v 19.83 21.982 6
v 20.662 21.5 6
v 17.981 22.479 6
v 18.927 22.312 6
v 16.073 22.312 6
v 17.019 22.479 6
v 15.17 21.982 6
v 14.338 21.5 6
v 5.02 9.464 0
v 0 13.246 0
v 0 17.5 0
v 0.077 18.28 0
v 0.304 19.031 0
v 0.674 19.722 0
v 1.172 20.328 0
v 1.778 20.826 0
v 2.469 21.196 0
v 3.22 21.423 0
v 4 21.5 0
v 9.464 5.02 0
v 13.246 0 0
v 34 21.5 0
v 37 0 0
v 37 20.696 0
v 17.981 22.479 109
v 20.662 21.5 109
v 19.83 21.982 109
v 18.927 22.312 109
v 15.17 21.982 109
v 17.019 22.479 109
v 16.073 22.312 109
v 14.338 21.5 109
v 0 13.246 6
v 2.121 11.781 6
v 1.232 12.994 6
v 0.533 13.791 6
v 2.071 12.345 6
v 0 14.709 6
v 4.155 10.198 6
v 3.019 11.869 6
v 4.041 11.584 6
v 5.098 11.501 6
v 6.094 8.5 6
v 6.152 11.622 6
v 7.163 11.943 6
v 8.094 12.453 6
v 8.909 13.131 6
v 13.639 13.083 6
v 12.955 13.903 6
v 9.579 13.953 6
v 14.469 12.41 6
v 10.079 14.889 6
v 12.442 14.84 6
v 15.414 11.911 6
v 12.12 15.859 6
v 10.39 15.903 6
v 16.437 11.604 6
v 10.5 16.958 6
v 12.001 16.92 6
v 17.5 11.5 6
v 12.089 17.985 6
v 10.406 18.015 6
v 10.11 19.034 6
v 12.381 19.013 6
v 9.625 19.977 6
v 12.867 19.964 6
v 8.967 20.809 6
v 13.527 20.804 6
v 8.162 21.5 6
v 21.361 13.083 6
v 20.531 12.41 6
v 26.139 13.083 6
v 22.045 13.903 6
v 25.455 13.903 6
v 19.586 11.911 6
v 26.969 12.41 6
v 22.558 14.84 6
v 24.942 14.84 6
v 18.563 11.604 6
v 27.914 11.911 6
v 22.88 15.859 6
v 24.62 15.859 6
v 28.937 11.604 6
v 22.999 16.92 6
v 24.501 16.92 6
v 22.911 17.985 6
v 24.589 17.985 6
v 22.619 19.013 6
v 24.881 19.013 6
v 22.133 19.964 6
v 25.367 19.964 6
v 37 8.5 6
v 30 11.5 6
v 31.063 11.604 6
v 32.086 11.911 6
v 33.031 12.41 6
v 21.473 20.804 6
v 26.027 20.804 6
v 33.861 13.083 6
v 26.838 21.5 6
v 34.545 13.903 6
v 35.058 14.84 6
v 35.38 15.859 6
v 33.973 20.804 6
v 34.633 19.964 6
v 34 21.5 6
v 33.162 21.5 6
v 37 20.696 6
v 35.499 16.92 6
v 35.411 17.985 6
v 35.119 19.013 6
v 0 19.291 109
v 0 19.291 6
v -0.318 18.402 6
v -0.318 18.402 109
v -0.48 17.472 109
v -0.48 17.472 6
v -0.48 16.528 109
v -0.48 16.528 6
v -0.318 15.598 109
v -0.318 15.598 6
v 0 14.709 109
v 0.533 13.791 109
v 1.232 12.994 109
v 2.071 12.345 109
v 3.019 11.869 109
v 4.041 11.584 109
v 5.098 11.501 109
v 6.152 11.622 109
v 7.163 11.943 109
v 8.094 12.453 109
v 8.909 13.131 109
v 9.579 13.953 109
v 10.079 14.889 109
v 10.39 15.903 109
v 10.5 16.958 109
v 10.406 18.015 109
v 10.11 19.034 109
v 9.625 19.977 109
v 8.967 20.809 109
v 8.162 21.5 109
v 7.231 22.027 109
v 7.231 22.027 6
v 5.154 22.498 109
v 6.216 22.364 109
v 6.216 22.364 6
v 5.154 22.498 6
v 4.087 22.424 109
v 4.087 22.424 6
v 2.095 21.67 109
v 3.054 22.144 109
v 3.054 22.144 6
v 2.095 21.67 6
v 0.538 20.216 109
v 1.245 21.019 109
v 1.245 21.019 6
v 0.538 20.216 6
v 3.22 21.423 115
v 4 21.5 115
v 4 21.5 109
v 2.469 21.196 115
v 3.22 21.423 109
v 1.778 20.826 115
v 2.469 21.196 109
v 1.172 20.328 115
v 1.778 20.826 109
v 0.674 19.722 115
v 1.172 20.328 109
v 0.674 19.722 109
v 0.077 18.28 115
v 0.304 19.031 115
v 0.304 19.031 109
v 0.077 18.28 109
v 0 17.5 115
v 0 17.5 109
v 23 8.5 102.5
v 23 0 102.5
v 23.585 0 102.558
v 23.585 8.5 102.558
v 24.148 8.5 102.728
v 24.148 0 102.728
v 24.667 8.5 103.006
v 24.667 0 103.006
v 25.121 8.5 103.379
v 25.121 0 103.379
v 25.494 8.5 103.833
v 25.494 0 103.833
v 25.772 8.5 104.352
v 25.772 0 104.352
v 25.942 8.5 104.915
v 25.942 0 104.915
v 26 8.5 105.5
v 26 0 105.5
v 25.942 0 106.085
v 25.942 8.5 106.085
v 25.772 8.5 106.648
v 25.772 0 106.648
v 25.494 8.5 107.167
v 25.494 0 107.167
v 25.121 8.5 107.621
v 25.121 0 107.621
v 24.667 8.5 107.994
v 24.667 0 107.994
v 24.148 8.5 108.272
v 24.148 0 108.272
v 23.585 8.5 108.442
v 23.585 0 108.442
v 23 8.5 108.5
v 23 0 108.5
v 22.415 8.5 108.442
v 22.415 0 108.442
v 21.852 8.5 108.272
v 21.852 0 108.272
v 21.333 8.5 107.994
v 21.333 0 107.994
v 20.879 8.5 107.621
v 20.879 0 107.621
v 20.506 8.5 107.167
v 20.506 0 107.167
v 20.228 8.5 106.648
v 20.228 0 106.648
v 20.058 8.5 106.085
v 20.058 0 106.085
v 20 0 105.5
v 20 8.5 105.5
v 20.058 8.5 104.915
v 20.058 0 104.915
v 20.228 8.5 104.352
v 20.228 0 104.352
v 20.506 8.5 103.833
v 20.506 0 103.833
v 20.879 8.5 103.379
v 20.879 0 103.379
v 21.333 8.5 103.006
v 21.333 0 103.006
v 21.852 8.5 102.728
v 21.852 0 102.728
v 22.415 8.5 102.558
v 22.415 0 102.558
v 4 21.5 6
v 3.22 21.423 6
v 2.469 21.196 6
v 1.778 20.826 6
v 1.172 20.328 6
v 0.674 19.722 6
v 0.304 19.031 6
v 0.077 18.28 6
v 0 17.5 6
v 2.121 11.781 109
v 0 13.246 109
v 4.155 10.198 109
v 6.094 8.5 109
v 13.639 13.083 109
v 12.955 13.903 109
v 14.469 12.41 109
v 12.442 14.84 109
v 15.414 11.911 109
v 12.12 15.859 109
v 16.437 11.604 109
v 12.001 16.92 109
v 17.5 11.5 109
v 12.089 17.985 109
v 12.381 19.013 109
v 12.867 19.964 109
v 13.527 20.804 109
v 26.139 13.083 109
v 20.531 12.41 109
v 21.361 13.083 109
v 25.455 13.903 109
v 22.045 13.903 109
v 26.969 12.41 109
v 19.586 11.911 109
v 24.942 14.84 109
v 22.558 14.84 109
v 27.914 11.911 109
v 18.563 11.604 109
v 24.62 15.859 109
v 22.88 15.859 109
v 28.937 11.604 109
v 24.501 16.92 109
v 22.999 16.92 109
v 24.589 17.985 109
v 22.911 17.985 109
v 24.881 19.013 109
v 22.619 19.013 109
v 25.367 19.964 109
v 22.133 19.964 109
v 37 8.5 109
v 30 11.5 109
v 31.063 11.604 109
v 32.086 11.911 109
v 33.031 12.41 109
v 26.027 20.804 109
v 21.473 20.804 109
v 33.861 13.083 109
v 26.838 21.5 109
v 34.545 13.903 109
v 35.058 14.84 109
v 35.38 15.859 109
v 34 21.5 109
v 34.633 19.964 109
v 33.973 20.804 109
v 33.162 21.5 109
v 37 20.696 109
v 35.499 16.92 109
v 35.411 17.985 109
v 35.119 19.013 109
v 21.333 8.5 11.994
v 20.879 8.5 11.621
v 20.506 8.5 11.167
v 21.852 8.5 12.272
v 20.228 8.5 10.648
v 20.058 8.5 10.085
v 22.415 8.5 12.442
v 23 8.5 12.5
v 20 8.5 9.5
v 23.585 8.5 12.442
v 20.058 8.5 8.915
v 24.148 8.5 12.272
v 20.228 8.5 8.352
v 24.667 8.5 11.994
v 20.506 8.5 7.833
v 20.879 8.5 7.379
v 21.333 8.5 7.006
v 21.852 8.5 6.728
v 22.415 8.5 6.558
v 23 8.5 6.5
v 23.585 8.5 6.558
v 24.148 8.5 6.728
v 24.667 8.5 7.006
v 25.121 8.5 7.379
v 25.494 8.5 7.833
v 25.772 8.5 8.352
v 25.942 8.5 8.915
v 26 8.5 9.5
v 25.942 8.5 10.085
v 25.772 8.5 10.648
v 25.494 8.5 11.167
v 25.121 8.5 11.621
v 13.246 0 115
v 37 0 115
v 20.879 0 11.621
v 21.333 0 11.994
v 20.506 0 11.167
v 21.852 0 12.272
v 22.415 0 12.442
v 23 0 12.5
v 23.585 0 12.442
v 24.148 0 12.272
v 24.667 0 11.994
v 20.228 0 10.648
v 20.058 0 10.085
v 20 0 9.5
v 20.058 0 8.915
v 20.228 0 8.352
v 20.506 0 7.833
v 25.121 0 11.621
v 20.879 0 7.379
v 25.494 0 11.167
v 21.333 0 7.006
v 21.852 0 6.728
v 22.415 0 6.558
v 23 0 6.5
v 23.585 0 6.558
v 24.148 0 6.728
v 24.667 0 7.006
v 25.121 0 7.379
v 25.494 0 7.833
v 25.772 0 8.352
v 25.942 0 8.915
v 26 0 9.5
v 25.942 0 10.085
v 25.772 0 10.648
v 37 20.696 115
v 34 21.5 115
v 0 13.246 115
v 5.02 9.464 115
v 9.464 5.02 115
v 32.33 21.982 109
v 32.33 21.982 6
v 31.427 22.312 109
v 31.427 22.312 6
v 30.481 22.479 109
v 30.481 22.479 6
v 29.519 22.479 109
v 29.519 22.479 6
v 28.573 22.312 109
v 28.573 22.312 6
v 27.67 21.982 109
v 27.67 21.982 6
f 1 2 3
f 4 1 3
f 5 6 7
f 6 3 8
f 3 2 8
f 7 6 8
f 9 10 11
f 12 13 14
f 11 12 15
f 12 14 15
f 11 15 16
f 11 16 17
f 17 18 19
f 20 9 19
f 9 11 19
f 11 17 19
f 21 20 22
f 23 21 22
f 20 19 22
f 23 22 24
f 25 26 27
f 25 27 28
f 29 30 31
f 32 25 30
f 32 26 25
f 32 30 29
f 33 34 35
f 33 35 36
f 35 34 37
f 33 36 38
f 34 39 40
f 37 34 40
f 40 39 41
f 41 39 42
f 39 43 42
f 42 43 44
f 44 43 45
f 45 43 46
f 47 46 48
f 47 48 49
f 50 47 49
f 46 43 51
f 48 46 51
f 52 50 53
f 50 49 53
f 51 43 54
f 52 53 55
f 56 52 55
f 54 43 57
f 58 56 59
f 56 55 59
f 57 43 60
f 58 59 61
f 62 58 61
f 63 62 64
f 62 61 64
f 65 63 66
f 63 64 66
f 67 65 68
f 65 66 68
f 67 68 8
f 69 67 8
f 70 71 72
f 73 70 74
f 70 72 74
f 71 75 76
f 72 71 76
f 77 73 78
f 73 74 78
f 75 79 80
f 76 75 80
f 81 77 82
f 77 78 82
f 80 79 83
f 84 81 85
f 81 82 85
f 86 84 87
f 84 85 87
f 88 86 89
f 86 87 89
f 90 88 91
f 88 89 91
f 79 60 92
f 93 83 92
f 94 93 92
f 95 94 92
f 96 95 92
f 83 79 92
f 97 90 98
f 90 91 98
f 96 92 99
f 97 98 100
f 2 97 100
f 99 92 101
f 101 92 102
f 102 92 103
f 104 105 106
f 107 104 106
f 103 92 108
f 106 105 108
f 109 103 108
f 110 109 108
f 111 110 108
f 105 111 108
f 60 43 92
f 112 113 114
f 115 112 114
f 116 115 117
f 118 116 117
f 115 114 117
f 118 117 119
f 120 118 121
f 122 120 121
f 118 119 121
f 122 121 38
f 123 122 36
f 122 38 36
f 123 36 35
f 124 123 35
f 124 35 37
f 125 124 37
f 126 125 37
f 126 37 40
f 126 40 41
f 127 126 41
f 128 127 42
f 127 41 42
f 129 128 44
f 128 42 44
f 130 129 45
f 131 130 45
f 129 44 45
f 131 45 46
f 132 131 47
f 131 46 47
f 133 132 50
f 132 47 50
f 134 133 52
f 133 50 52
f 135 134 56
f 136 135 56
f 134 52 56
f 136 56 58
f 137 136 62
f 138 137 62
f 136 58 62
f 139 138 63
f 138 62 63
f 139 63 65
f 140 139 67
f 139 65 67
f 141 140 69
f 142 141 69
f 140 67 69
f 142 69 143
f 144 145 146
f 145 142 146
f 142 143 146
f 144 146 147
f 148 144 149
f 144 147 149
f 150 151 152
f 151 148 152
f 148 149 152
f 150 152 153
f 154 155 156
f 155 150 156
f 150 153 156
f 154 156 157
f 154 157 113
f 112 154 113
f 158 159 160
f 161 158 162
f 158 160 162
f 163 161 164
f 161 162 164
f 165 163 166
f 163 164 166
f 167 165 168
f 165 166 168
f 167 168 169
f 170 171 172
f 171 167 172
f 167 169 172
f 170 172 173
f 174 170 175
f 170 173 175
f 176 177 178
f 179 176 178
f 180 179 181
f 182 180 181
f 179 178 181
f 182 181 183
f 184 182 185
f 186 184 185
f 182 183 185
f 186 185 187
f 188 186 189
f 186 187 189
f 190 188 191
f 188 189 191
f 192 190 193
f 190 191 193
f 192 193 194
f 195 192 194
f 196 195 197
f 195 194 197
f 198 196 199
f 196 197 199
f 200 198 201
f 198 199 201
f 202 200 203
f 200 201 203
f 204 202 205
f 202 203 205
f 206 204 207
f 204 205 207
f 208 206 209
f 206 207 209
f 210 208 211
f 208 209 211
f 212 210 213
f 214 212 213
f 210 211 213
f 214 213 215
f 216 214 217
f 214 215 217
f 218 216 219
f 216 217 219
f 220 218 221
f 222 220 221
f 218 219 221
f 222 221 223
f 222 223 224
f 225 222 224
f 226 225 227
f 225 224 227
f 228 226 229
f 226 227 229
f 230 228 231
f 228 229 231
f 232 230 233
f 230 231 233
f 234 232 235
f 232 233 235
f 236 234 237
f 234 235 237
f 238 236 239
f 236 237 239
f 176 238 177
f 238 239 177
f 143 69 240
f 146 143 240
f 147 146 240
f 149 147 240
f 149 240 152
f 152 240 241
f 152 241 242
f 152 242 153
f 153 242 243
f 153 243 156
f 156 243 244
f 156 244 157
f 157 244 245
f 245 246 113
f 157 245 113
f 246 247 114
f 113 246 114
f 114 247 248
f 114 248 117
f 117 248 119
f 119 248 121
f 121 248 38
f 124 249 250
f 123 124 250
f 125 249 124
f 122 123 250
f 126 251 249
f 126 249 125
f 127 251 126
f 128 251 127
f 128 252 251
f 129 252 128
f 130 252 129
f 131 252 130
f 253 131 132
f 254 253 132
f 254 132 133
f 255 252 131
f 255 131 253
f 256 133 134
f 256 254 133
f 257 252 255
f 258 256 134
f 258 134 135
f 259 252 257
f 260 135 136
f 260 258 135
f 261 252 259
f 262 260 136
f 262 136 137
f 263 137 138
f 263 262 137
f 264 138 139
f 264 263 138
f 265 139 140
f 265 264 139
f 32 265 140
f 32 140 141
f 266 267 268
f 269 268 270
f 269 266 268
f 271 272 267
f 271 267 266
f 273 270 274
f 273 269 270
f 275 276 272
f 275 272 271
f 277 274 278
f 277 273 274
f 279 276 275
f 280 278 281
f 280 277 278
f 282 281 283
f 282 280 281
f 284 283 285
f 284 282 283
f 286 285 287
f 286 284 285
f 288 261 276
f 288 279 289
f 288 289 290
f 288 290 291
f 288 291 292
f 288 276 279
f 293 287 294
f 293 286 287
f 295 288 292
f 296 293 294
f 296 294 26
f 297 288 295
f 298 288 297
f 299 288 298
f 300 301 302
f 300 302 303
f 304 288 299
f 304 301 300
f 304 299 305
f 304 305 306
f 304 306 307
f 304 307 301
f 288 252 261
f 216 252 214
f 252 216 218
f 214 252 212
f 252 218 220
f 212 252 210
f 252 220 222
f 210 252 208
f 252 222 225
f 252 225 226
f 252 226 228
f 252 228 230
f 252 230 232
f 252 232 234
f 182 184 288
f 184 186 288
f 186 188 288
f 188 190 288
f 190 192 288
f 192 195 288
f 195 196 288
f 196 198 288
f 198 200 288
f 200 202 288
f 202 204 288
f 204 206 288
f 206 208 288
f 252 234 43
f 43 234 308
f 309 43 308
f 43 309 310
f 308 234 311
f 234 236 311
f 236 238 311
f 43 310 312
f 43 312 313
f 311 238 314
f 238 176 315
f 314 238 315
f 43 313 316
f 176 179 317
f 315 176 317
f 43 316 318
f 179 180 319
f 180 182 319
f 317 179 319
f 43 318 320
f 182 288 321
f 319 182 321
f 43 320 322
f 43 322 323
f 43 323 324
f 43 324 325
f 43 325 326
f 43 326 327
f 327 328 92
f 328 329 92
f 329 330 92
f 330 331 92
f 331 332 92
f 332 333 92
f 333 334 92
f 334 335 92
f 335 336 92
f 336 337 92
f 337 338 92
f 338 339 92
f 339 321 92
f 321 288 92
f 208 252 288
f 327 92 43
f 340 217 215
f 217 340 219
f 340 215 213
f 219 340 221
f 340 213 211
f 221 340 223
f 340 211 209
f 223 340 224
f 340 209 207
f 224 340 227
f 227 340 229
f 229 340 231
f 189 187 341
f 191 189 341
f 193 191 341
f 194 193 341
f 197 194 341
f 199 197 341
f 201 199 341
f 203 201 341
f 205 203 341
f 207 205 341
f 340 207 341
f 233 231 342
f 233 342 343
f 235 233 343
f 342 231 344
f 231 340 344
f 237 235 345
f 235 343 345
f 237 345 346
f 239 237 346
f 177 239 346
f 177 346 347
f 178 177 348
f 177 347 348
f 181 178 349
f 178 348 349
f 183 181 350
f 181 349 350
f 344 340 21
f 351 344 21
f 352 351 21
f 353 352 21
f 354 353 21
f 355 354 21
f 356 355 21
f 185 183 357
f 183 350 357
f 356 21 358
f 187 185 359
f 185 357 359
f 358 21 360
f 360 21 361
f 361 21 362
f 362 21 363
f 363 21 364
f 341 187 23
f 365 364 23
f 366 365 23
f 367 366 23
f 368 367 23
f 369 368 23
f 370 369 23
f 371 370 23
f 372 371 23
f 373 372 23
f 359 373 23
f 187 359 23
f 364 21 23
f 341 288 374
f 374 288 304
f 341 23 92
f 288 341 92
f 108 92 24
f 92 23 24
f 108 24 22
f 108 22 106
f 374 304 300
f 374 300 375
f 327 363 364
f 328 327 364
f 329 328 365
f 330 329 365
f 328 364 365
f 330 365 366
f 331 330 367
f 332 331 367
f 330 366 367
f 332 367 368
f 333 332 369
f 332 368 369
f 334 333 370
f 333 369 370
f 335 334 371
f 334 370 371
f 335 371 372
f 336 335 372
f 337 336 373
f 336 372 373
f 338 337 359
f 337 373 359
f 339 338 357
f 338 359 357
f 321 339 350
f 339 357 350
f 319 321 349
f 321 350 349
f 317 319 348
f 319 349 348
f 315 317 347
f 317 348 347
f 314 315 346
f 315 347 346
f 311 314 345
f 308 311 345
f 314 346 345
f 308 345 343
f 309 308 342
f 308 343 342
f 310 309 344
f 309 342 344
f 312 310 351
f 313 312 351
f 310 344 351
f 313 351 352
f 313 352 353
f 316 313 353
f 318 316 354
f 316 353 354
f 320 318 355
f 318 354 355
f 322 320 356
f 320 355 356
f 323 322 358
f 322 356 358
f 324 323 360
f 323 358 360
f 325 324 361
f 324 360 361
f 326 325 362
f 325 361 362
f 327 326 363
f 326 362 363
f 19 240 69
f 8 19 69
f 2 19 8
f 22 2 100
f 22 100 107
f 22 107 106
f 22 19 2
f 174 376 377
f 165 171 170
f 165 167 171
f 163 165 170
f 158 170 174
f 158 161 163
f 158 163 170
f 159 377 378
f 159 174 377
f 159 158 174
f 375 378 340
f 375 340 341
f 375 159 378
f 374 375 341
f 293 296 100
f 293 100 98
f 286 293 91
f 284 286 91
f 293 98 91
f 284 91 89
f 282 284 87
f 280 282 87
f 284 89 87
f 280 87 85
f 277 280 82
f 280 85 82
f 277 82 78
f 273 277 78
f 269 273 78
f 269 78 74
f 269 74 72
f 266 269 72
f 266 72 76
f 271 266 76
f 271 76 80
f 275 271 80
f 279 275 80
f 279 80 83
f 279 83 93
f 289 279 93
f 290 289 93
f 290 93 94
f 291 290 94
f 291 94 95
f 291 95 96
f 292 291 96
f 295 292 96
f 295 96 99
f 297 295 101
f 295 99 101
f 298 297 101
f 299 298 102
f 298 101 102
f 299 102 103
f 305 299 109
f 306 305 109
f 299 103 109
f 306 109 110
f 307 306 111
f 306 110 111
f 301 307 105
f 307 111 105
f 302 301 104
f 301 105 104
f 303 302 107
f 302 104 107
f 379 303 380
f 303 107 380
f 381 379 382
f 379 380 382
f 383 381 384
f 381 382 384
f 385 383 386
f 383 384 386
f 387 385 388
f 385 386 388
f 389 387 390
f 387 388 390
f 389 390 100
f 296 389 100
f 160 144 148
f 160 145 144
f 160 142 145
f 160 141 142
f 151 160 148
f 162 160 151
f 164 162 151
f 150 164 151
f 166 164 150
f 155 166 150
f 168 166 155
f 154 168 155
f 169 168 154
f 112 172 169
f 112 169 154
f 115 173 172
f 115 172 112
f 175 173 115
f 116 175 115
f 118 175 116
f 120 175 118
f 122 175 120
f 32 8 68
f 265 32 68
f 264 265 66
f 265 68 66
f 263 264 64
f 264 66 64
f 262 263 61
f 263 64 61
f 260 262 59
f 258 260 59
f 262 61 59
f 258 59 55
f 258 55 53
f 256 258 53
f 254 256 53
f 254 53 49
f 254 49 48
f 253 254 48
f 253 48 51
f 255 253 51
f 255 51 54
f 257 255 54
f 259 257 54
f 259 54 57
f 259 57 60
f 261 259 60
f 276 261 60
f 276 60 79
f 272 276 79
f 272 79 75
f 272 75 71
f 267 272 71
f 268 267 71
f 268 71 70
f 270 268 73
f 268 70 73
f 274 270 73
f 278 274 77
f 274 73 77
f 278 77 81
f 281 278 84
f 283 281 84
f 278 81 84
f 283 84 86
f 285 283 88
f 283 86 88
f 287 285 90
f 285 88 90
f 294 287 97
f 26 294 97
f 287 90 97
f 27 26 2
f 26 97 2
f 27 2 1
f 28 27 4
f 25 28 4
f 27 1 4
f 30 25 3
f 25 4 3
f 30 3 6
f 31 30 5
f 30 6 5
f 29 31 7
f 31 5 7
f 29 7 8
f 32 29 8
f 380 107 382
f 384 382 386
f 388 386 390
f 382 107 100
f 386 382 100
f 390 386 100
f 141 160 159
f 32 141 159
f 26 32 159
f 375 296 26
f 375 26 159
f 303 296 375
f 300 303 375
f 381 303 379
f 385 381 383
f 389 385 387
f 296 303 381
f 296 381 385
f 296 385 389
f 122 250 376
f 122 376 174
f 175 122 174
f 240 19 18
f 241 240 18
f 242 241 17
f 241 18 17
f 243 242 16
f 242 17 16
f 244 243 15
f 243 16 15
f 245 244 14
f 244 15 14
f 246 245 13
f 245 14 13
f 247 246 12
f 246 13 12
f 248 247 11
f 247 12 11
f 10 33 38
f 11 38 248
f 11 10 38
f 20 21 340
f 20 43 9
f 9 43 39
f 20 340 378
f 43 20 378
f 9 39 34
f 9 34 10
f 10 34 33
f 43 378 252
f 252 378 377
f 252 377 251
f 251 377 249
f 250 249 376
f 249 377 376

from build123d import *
from OCP.BRepFilletAPI import BRepFilletAPI_MakeChamfer

# Parameters (mm, degrees)
SCHIZZO1_W               = 37
SCHIZZO1_H               = 21.5
ESTRUSIONE1_DEPTH        = 115
SCHIZZO6_W               = 103
SCHIZZO6_H               = 23.639461627
TAGLIO_ESTRUSIONE4_DEPTH = 84
SCHIZZO7_R               = 5.5
ESTRUSIONE4_DEPTH        = 103
SMUSSO1_SIZE             = 3
SMUSSO1_SIZE2            = 0.803847577
RACCORDO1_R              = 4
SCHIZZO8_R               = 45
TAGLIO_ESTRUSIONE5_DEPTH = 123.883074506
SCHIZZO9_R               = 3
TAGLIO_ESTRUSIONE6_DEPTH = 8.5


with BuildPart() as part:
    # Schizzo1 → Estrusione1 (new body)
    with BuildSketch(Plane.XY):
        with Locations((18.5, 10.75)):
            Rectangle(SCHIZZO1_W, SCHIZZO1_H)
    extrude(amount=ESTRUSIONE1_DEPTH)

    # Schizzo6 → Taglio-Estrusione4 (cut)
    with BuildSketch(Plane(origin=(37, 0, 0), x_dir=(0, 0, -1), z_dir=(1, 0, 0))):
        with Locations((-57.5, 20.319730814)):
            Rectangle(SCHIZZO6_W, SCHIZZO6_H)
    extrude(amount=-TAGLIO_ESTRUSIONE4_DEPTH, mode=Mode.SUBTRACT)

    # Schizzo7 → Estrusione4 (add)
    with BuildSketch(Plane.XY.offset(6)):
        with Locations(Location((5, 17, 0), (0, 0, 155.380022671))):
            Circle(SCHIZZO7_R)
        with Locations(Location((17.5, 17, 0), (0, 0, 125.096801228))):
            Circle(SCHIZZO7_R)
        with Locations(Location((30, 17, 0), (0, 0, 125.096801228))):
            Circle(SCHIZZO7_R)
    extrude(amount=ESTRUSIONE4_DEPTH)

    # Smusso1: one chamfer whose edges measure the first distance from different faces: ONE call of the kernel's chamfer builder (chamfer() names one face for all edges)
    smusso1_edges_1 = [part.edges().sort_by_distance(p)[0] for p in [
        (37, 21.5, 3),
    ]]
    smusso1_side_1 = [part.faces().sort_by_distance(p)[0] for p in [
        (18.5, 21.5, 3),
    ]]
    smusso1_edges_2 = [part.edges().sort_by_distance(p)[0] for p in [
        (37, 21.5, 112),
    ]]
    smusso1_side_2 = [part.faces().sort_by_distance(p)[0] for p in [
        (18.5, 21.5, 112),
    ]]
    smusso1 = BRepFilletAPI_MakeChamfer(part.part.solid().wrapped)
    for e in smusso1_edges_1:
        smusso1.Add(SMUSSO1_SIZE, SMUSSO1_SIZE2, e.wrapped, smusso1_side_1[0].wrapped)  # the first distance lies on this face
    for e in smusso1_edges_2:
        smusso1.Add(SMUSSO1_SIZE, SMUSSO1_SIZE2, e.wrapped, smusso1_side_2[0].wrapped)  # the first distance lies on this face
    add(Compound.cast(smusso1.Shape()), mode=Mode.REPLACE)

    # Raccordo1
    # the kernel refuses this fillet: 4 mm, written as the material it takes off along each edge
    with BuildSketch(Plane(origin=(0, 21.5, -10), x_dir=(1, 0, 0), z_dir=(0, 0, 1))) as raccordo1_piece_1:
        with BuildLine():
            CenterArc((RACCORDO1_R, -RACCORDO1_R), RACCORDO1_R, 90, 90)
            Line((0, -RACCORDO1_R), (0, 0))
            Line((0, 0), (RACCORDO1_R, 0))
        make_face()
    extrude(amount=16, mode=Mode.SUBTRACT)
    with BuildSketch(Plane(origin=(0, 21.5, 109), x_dir=(0, -1, 0), z_dir=(0, 0, 1))) as raccordo1_piece_2:
        with BuildLine():
            CenterArc((RACCORDO1_R, RACCORDO1_R), RACCORDO1_R, 180, 90)
            Line((0, RACCORDO1_R), (0, 0))
            Line((0, 0), (RACCORDO1_R, 0))
        make_face()
    extrude(amount=16, mode=Mode.SUBTRACT)

    # Schizzo8 → Taglio-Estrusione5 (cut, through all)
    with BuildSketch(Plane.XY.offset(115)):
        with Locations((-24.5, -24.5)):
            Circle(SCHIZZO8_R)
    extrude(amount=-TAGLIO_ESTRUSIONE5_DEPTH, mode=Mode.SUBTRACT)

    # Schizzo9 → Taglio-Estrusione6 (cut)
    with BuildSketch(Plane.XZ):
        with Locations(Location((23, 105.5, 0), (0, 0, 270))):
            Circle(SCHIZZO9_R)
        with Locations(Location((23, 9.5, 0), (0, 0, 270))):
            Circle(SCHIZZO9_R)
    extrude(amount=-TAGLIO_ESTRUSIONE6_DEPTH, mode=Mode.SUBTRACT)


solid = part.part
